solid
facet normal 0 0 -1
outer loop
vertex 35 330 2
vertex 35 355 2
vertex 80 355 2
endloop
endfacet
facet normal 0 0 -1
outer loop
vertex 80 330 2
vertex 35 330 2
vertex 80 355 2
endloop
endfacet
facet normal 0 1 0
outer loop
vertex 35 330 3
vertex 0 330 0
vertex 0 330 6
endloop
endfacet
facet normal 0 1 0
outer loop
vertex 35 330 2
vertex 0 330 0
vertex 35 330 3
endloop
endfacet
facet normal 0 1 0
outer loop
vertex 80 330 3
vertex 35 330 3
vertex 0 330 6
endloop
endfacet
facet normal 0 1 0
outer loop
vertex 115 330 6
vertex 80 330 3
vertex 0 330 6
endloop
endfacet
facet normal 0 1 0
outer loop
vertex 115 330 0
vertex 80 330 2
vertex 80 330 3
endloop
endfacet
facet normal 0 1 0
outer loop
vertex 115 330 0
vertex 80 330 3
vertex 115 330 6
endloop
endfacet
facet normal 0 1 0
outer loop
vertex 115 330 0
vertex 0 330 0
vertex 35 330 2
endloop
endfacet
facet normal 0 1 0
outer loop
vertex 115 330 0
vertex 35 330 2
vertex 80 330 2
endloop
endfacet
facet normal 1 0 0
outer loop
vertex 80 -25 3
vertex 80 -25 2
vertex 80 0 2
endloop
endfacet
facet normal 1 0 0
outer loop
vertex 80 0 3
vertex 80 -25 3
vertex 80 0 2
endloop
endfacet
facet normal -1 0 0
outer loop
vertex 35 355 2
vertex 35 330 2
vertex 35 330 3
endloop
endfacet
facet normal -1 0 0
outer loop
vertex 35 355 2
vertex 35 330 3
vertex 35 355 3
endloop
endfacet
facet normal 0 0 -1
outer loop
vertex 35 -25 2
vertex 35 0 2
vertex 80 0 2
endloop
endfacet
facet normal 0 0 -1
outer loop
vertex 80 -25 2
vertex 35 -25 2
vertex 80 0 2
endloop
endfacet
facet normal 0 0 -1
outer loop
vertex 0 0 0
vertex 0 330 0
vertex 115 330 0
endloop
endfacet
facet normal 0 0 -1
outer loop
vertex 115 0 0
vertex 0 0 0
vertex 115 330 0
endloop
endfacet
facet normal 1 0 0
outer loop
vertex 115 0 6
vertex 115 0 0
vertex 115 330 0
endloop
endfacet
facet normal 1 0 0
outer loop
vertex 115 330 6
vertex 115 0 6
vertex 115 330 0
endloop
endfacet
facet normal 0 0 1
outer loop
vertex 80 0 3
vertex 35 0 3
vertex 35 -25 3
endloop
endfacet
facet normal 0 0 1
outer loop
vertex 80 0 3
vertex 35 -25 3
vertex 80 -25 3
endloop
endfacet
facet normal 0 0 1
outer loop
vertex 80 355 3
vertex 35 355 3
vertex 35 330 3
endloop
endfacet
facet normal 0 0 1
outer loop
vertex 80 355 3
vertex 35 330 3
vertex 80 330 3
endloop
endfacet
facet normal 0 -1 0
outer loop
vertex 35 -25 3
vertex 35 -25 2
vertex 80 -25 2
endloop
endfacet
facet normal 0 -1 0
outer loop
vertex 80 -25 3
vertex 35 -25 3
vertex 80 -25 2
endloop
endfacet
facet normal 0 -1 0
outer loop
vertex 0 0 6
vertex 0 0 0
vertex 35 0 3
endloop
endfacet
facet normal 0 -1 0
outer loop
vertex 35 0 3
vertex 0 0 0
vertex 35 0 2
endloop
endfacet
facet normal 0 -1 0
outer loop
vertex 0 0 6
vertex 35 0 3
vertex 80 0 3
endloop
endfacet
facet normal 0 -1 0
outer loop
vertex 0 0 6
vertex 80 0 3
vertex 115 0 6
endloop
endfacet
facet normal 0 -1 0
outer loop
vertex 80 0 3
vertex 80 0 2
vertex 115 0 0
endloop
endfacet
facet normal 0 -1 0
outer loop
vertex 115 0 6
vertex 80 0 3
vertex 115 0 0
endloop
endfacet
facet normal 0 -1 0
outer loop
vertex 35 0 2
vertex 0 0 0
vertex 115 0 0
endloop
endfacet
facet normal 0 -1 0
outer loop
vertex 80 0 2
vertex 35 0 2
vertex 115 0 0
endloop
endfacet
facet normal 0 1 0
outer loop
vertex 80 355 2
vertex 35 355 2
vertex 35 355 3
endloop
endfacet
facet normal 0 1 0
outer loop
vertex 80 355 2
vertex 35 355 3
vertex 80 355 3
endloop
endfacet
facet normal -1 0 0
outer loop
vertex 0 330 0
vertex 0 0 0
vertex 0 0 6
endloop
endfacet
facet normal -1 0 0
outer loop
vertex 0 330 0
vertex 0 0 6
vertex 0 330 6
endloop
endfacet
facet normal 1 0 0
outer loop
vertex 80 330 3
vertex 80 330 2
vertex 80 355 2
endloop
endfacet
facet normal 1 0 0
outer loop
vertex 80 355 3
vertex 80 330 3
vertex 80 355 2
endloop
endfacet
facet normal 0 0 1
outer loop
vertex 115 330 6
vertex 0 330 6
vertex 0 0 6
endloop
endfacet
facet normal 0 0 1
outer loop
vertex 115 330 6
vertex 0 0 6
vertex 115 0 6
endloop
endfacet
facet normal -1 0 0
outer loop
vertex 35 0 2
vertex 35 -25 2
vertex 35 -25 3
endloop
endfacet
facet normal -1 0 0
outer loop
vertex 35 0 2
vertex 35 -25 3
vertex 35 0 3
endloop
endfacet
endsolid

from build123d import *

# Parameters (mm, degrees)
BOX004_W     = 45
BOX004_H     = 25
BOX004_DEPTH = 1
BOX001_W     = 115
BOX001_H     = 330
BOX001_DEPTH = 6
BOX005_W     = 45
BOX005_H     = 25
BOX005_DEPTH = 1


with BuildPart() as box004:
    # Box004 → Box004 (new body)
    with BuildSketch(Plane(origin=(35, -25, 2), x_dir=(1, 0, 0), z_dir=(0, 0, 1))):
        with Locations((22.5, 12.5)):
            Rectangle(BOX004_W, BOX004_H)
    extrude(amount=BOX004_DEPTH)


with BuildPart() as box001:
    # Box001 → Box001 (new body)
    with BuildSketch(Plane.XY):
        with Locations((57.5, 165)):
            Rectangle(BOX001_W, BOX001_H)
    extrude(amount=BOX001_DEPTH)


with BuildPart() as fusion003:
    # Box005 → Box005 (new body)
    with BuildSketch(Plane(origin=(35, 330, 2), x_dir=(1, 0, 0), z_dir=(0, 0, 1))):
        with Locations((22.5, 12.5)):
            Rectangle(BOX005_W, BOX005_H)
    extrude(amount=BOX005_DEPTH)

    # Fusion003: union Box004, Box001
    add(box004.part)
    add(box001.part)


solid = fusion003.part
